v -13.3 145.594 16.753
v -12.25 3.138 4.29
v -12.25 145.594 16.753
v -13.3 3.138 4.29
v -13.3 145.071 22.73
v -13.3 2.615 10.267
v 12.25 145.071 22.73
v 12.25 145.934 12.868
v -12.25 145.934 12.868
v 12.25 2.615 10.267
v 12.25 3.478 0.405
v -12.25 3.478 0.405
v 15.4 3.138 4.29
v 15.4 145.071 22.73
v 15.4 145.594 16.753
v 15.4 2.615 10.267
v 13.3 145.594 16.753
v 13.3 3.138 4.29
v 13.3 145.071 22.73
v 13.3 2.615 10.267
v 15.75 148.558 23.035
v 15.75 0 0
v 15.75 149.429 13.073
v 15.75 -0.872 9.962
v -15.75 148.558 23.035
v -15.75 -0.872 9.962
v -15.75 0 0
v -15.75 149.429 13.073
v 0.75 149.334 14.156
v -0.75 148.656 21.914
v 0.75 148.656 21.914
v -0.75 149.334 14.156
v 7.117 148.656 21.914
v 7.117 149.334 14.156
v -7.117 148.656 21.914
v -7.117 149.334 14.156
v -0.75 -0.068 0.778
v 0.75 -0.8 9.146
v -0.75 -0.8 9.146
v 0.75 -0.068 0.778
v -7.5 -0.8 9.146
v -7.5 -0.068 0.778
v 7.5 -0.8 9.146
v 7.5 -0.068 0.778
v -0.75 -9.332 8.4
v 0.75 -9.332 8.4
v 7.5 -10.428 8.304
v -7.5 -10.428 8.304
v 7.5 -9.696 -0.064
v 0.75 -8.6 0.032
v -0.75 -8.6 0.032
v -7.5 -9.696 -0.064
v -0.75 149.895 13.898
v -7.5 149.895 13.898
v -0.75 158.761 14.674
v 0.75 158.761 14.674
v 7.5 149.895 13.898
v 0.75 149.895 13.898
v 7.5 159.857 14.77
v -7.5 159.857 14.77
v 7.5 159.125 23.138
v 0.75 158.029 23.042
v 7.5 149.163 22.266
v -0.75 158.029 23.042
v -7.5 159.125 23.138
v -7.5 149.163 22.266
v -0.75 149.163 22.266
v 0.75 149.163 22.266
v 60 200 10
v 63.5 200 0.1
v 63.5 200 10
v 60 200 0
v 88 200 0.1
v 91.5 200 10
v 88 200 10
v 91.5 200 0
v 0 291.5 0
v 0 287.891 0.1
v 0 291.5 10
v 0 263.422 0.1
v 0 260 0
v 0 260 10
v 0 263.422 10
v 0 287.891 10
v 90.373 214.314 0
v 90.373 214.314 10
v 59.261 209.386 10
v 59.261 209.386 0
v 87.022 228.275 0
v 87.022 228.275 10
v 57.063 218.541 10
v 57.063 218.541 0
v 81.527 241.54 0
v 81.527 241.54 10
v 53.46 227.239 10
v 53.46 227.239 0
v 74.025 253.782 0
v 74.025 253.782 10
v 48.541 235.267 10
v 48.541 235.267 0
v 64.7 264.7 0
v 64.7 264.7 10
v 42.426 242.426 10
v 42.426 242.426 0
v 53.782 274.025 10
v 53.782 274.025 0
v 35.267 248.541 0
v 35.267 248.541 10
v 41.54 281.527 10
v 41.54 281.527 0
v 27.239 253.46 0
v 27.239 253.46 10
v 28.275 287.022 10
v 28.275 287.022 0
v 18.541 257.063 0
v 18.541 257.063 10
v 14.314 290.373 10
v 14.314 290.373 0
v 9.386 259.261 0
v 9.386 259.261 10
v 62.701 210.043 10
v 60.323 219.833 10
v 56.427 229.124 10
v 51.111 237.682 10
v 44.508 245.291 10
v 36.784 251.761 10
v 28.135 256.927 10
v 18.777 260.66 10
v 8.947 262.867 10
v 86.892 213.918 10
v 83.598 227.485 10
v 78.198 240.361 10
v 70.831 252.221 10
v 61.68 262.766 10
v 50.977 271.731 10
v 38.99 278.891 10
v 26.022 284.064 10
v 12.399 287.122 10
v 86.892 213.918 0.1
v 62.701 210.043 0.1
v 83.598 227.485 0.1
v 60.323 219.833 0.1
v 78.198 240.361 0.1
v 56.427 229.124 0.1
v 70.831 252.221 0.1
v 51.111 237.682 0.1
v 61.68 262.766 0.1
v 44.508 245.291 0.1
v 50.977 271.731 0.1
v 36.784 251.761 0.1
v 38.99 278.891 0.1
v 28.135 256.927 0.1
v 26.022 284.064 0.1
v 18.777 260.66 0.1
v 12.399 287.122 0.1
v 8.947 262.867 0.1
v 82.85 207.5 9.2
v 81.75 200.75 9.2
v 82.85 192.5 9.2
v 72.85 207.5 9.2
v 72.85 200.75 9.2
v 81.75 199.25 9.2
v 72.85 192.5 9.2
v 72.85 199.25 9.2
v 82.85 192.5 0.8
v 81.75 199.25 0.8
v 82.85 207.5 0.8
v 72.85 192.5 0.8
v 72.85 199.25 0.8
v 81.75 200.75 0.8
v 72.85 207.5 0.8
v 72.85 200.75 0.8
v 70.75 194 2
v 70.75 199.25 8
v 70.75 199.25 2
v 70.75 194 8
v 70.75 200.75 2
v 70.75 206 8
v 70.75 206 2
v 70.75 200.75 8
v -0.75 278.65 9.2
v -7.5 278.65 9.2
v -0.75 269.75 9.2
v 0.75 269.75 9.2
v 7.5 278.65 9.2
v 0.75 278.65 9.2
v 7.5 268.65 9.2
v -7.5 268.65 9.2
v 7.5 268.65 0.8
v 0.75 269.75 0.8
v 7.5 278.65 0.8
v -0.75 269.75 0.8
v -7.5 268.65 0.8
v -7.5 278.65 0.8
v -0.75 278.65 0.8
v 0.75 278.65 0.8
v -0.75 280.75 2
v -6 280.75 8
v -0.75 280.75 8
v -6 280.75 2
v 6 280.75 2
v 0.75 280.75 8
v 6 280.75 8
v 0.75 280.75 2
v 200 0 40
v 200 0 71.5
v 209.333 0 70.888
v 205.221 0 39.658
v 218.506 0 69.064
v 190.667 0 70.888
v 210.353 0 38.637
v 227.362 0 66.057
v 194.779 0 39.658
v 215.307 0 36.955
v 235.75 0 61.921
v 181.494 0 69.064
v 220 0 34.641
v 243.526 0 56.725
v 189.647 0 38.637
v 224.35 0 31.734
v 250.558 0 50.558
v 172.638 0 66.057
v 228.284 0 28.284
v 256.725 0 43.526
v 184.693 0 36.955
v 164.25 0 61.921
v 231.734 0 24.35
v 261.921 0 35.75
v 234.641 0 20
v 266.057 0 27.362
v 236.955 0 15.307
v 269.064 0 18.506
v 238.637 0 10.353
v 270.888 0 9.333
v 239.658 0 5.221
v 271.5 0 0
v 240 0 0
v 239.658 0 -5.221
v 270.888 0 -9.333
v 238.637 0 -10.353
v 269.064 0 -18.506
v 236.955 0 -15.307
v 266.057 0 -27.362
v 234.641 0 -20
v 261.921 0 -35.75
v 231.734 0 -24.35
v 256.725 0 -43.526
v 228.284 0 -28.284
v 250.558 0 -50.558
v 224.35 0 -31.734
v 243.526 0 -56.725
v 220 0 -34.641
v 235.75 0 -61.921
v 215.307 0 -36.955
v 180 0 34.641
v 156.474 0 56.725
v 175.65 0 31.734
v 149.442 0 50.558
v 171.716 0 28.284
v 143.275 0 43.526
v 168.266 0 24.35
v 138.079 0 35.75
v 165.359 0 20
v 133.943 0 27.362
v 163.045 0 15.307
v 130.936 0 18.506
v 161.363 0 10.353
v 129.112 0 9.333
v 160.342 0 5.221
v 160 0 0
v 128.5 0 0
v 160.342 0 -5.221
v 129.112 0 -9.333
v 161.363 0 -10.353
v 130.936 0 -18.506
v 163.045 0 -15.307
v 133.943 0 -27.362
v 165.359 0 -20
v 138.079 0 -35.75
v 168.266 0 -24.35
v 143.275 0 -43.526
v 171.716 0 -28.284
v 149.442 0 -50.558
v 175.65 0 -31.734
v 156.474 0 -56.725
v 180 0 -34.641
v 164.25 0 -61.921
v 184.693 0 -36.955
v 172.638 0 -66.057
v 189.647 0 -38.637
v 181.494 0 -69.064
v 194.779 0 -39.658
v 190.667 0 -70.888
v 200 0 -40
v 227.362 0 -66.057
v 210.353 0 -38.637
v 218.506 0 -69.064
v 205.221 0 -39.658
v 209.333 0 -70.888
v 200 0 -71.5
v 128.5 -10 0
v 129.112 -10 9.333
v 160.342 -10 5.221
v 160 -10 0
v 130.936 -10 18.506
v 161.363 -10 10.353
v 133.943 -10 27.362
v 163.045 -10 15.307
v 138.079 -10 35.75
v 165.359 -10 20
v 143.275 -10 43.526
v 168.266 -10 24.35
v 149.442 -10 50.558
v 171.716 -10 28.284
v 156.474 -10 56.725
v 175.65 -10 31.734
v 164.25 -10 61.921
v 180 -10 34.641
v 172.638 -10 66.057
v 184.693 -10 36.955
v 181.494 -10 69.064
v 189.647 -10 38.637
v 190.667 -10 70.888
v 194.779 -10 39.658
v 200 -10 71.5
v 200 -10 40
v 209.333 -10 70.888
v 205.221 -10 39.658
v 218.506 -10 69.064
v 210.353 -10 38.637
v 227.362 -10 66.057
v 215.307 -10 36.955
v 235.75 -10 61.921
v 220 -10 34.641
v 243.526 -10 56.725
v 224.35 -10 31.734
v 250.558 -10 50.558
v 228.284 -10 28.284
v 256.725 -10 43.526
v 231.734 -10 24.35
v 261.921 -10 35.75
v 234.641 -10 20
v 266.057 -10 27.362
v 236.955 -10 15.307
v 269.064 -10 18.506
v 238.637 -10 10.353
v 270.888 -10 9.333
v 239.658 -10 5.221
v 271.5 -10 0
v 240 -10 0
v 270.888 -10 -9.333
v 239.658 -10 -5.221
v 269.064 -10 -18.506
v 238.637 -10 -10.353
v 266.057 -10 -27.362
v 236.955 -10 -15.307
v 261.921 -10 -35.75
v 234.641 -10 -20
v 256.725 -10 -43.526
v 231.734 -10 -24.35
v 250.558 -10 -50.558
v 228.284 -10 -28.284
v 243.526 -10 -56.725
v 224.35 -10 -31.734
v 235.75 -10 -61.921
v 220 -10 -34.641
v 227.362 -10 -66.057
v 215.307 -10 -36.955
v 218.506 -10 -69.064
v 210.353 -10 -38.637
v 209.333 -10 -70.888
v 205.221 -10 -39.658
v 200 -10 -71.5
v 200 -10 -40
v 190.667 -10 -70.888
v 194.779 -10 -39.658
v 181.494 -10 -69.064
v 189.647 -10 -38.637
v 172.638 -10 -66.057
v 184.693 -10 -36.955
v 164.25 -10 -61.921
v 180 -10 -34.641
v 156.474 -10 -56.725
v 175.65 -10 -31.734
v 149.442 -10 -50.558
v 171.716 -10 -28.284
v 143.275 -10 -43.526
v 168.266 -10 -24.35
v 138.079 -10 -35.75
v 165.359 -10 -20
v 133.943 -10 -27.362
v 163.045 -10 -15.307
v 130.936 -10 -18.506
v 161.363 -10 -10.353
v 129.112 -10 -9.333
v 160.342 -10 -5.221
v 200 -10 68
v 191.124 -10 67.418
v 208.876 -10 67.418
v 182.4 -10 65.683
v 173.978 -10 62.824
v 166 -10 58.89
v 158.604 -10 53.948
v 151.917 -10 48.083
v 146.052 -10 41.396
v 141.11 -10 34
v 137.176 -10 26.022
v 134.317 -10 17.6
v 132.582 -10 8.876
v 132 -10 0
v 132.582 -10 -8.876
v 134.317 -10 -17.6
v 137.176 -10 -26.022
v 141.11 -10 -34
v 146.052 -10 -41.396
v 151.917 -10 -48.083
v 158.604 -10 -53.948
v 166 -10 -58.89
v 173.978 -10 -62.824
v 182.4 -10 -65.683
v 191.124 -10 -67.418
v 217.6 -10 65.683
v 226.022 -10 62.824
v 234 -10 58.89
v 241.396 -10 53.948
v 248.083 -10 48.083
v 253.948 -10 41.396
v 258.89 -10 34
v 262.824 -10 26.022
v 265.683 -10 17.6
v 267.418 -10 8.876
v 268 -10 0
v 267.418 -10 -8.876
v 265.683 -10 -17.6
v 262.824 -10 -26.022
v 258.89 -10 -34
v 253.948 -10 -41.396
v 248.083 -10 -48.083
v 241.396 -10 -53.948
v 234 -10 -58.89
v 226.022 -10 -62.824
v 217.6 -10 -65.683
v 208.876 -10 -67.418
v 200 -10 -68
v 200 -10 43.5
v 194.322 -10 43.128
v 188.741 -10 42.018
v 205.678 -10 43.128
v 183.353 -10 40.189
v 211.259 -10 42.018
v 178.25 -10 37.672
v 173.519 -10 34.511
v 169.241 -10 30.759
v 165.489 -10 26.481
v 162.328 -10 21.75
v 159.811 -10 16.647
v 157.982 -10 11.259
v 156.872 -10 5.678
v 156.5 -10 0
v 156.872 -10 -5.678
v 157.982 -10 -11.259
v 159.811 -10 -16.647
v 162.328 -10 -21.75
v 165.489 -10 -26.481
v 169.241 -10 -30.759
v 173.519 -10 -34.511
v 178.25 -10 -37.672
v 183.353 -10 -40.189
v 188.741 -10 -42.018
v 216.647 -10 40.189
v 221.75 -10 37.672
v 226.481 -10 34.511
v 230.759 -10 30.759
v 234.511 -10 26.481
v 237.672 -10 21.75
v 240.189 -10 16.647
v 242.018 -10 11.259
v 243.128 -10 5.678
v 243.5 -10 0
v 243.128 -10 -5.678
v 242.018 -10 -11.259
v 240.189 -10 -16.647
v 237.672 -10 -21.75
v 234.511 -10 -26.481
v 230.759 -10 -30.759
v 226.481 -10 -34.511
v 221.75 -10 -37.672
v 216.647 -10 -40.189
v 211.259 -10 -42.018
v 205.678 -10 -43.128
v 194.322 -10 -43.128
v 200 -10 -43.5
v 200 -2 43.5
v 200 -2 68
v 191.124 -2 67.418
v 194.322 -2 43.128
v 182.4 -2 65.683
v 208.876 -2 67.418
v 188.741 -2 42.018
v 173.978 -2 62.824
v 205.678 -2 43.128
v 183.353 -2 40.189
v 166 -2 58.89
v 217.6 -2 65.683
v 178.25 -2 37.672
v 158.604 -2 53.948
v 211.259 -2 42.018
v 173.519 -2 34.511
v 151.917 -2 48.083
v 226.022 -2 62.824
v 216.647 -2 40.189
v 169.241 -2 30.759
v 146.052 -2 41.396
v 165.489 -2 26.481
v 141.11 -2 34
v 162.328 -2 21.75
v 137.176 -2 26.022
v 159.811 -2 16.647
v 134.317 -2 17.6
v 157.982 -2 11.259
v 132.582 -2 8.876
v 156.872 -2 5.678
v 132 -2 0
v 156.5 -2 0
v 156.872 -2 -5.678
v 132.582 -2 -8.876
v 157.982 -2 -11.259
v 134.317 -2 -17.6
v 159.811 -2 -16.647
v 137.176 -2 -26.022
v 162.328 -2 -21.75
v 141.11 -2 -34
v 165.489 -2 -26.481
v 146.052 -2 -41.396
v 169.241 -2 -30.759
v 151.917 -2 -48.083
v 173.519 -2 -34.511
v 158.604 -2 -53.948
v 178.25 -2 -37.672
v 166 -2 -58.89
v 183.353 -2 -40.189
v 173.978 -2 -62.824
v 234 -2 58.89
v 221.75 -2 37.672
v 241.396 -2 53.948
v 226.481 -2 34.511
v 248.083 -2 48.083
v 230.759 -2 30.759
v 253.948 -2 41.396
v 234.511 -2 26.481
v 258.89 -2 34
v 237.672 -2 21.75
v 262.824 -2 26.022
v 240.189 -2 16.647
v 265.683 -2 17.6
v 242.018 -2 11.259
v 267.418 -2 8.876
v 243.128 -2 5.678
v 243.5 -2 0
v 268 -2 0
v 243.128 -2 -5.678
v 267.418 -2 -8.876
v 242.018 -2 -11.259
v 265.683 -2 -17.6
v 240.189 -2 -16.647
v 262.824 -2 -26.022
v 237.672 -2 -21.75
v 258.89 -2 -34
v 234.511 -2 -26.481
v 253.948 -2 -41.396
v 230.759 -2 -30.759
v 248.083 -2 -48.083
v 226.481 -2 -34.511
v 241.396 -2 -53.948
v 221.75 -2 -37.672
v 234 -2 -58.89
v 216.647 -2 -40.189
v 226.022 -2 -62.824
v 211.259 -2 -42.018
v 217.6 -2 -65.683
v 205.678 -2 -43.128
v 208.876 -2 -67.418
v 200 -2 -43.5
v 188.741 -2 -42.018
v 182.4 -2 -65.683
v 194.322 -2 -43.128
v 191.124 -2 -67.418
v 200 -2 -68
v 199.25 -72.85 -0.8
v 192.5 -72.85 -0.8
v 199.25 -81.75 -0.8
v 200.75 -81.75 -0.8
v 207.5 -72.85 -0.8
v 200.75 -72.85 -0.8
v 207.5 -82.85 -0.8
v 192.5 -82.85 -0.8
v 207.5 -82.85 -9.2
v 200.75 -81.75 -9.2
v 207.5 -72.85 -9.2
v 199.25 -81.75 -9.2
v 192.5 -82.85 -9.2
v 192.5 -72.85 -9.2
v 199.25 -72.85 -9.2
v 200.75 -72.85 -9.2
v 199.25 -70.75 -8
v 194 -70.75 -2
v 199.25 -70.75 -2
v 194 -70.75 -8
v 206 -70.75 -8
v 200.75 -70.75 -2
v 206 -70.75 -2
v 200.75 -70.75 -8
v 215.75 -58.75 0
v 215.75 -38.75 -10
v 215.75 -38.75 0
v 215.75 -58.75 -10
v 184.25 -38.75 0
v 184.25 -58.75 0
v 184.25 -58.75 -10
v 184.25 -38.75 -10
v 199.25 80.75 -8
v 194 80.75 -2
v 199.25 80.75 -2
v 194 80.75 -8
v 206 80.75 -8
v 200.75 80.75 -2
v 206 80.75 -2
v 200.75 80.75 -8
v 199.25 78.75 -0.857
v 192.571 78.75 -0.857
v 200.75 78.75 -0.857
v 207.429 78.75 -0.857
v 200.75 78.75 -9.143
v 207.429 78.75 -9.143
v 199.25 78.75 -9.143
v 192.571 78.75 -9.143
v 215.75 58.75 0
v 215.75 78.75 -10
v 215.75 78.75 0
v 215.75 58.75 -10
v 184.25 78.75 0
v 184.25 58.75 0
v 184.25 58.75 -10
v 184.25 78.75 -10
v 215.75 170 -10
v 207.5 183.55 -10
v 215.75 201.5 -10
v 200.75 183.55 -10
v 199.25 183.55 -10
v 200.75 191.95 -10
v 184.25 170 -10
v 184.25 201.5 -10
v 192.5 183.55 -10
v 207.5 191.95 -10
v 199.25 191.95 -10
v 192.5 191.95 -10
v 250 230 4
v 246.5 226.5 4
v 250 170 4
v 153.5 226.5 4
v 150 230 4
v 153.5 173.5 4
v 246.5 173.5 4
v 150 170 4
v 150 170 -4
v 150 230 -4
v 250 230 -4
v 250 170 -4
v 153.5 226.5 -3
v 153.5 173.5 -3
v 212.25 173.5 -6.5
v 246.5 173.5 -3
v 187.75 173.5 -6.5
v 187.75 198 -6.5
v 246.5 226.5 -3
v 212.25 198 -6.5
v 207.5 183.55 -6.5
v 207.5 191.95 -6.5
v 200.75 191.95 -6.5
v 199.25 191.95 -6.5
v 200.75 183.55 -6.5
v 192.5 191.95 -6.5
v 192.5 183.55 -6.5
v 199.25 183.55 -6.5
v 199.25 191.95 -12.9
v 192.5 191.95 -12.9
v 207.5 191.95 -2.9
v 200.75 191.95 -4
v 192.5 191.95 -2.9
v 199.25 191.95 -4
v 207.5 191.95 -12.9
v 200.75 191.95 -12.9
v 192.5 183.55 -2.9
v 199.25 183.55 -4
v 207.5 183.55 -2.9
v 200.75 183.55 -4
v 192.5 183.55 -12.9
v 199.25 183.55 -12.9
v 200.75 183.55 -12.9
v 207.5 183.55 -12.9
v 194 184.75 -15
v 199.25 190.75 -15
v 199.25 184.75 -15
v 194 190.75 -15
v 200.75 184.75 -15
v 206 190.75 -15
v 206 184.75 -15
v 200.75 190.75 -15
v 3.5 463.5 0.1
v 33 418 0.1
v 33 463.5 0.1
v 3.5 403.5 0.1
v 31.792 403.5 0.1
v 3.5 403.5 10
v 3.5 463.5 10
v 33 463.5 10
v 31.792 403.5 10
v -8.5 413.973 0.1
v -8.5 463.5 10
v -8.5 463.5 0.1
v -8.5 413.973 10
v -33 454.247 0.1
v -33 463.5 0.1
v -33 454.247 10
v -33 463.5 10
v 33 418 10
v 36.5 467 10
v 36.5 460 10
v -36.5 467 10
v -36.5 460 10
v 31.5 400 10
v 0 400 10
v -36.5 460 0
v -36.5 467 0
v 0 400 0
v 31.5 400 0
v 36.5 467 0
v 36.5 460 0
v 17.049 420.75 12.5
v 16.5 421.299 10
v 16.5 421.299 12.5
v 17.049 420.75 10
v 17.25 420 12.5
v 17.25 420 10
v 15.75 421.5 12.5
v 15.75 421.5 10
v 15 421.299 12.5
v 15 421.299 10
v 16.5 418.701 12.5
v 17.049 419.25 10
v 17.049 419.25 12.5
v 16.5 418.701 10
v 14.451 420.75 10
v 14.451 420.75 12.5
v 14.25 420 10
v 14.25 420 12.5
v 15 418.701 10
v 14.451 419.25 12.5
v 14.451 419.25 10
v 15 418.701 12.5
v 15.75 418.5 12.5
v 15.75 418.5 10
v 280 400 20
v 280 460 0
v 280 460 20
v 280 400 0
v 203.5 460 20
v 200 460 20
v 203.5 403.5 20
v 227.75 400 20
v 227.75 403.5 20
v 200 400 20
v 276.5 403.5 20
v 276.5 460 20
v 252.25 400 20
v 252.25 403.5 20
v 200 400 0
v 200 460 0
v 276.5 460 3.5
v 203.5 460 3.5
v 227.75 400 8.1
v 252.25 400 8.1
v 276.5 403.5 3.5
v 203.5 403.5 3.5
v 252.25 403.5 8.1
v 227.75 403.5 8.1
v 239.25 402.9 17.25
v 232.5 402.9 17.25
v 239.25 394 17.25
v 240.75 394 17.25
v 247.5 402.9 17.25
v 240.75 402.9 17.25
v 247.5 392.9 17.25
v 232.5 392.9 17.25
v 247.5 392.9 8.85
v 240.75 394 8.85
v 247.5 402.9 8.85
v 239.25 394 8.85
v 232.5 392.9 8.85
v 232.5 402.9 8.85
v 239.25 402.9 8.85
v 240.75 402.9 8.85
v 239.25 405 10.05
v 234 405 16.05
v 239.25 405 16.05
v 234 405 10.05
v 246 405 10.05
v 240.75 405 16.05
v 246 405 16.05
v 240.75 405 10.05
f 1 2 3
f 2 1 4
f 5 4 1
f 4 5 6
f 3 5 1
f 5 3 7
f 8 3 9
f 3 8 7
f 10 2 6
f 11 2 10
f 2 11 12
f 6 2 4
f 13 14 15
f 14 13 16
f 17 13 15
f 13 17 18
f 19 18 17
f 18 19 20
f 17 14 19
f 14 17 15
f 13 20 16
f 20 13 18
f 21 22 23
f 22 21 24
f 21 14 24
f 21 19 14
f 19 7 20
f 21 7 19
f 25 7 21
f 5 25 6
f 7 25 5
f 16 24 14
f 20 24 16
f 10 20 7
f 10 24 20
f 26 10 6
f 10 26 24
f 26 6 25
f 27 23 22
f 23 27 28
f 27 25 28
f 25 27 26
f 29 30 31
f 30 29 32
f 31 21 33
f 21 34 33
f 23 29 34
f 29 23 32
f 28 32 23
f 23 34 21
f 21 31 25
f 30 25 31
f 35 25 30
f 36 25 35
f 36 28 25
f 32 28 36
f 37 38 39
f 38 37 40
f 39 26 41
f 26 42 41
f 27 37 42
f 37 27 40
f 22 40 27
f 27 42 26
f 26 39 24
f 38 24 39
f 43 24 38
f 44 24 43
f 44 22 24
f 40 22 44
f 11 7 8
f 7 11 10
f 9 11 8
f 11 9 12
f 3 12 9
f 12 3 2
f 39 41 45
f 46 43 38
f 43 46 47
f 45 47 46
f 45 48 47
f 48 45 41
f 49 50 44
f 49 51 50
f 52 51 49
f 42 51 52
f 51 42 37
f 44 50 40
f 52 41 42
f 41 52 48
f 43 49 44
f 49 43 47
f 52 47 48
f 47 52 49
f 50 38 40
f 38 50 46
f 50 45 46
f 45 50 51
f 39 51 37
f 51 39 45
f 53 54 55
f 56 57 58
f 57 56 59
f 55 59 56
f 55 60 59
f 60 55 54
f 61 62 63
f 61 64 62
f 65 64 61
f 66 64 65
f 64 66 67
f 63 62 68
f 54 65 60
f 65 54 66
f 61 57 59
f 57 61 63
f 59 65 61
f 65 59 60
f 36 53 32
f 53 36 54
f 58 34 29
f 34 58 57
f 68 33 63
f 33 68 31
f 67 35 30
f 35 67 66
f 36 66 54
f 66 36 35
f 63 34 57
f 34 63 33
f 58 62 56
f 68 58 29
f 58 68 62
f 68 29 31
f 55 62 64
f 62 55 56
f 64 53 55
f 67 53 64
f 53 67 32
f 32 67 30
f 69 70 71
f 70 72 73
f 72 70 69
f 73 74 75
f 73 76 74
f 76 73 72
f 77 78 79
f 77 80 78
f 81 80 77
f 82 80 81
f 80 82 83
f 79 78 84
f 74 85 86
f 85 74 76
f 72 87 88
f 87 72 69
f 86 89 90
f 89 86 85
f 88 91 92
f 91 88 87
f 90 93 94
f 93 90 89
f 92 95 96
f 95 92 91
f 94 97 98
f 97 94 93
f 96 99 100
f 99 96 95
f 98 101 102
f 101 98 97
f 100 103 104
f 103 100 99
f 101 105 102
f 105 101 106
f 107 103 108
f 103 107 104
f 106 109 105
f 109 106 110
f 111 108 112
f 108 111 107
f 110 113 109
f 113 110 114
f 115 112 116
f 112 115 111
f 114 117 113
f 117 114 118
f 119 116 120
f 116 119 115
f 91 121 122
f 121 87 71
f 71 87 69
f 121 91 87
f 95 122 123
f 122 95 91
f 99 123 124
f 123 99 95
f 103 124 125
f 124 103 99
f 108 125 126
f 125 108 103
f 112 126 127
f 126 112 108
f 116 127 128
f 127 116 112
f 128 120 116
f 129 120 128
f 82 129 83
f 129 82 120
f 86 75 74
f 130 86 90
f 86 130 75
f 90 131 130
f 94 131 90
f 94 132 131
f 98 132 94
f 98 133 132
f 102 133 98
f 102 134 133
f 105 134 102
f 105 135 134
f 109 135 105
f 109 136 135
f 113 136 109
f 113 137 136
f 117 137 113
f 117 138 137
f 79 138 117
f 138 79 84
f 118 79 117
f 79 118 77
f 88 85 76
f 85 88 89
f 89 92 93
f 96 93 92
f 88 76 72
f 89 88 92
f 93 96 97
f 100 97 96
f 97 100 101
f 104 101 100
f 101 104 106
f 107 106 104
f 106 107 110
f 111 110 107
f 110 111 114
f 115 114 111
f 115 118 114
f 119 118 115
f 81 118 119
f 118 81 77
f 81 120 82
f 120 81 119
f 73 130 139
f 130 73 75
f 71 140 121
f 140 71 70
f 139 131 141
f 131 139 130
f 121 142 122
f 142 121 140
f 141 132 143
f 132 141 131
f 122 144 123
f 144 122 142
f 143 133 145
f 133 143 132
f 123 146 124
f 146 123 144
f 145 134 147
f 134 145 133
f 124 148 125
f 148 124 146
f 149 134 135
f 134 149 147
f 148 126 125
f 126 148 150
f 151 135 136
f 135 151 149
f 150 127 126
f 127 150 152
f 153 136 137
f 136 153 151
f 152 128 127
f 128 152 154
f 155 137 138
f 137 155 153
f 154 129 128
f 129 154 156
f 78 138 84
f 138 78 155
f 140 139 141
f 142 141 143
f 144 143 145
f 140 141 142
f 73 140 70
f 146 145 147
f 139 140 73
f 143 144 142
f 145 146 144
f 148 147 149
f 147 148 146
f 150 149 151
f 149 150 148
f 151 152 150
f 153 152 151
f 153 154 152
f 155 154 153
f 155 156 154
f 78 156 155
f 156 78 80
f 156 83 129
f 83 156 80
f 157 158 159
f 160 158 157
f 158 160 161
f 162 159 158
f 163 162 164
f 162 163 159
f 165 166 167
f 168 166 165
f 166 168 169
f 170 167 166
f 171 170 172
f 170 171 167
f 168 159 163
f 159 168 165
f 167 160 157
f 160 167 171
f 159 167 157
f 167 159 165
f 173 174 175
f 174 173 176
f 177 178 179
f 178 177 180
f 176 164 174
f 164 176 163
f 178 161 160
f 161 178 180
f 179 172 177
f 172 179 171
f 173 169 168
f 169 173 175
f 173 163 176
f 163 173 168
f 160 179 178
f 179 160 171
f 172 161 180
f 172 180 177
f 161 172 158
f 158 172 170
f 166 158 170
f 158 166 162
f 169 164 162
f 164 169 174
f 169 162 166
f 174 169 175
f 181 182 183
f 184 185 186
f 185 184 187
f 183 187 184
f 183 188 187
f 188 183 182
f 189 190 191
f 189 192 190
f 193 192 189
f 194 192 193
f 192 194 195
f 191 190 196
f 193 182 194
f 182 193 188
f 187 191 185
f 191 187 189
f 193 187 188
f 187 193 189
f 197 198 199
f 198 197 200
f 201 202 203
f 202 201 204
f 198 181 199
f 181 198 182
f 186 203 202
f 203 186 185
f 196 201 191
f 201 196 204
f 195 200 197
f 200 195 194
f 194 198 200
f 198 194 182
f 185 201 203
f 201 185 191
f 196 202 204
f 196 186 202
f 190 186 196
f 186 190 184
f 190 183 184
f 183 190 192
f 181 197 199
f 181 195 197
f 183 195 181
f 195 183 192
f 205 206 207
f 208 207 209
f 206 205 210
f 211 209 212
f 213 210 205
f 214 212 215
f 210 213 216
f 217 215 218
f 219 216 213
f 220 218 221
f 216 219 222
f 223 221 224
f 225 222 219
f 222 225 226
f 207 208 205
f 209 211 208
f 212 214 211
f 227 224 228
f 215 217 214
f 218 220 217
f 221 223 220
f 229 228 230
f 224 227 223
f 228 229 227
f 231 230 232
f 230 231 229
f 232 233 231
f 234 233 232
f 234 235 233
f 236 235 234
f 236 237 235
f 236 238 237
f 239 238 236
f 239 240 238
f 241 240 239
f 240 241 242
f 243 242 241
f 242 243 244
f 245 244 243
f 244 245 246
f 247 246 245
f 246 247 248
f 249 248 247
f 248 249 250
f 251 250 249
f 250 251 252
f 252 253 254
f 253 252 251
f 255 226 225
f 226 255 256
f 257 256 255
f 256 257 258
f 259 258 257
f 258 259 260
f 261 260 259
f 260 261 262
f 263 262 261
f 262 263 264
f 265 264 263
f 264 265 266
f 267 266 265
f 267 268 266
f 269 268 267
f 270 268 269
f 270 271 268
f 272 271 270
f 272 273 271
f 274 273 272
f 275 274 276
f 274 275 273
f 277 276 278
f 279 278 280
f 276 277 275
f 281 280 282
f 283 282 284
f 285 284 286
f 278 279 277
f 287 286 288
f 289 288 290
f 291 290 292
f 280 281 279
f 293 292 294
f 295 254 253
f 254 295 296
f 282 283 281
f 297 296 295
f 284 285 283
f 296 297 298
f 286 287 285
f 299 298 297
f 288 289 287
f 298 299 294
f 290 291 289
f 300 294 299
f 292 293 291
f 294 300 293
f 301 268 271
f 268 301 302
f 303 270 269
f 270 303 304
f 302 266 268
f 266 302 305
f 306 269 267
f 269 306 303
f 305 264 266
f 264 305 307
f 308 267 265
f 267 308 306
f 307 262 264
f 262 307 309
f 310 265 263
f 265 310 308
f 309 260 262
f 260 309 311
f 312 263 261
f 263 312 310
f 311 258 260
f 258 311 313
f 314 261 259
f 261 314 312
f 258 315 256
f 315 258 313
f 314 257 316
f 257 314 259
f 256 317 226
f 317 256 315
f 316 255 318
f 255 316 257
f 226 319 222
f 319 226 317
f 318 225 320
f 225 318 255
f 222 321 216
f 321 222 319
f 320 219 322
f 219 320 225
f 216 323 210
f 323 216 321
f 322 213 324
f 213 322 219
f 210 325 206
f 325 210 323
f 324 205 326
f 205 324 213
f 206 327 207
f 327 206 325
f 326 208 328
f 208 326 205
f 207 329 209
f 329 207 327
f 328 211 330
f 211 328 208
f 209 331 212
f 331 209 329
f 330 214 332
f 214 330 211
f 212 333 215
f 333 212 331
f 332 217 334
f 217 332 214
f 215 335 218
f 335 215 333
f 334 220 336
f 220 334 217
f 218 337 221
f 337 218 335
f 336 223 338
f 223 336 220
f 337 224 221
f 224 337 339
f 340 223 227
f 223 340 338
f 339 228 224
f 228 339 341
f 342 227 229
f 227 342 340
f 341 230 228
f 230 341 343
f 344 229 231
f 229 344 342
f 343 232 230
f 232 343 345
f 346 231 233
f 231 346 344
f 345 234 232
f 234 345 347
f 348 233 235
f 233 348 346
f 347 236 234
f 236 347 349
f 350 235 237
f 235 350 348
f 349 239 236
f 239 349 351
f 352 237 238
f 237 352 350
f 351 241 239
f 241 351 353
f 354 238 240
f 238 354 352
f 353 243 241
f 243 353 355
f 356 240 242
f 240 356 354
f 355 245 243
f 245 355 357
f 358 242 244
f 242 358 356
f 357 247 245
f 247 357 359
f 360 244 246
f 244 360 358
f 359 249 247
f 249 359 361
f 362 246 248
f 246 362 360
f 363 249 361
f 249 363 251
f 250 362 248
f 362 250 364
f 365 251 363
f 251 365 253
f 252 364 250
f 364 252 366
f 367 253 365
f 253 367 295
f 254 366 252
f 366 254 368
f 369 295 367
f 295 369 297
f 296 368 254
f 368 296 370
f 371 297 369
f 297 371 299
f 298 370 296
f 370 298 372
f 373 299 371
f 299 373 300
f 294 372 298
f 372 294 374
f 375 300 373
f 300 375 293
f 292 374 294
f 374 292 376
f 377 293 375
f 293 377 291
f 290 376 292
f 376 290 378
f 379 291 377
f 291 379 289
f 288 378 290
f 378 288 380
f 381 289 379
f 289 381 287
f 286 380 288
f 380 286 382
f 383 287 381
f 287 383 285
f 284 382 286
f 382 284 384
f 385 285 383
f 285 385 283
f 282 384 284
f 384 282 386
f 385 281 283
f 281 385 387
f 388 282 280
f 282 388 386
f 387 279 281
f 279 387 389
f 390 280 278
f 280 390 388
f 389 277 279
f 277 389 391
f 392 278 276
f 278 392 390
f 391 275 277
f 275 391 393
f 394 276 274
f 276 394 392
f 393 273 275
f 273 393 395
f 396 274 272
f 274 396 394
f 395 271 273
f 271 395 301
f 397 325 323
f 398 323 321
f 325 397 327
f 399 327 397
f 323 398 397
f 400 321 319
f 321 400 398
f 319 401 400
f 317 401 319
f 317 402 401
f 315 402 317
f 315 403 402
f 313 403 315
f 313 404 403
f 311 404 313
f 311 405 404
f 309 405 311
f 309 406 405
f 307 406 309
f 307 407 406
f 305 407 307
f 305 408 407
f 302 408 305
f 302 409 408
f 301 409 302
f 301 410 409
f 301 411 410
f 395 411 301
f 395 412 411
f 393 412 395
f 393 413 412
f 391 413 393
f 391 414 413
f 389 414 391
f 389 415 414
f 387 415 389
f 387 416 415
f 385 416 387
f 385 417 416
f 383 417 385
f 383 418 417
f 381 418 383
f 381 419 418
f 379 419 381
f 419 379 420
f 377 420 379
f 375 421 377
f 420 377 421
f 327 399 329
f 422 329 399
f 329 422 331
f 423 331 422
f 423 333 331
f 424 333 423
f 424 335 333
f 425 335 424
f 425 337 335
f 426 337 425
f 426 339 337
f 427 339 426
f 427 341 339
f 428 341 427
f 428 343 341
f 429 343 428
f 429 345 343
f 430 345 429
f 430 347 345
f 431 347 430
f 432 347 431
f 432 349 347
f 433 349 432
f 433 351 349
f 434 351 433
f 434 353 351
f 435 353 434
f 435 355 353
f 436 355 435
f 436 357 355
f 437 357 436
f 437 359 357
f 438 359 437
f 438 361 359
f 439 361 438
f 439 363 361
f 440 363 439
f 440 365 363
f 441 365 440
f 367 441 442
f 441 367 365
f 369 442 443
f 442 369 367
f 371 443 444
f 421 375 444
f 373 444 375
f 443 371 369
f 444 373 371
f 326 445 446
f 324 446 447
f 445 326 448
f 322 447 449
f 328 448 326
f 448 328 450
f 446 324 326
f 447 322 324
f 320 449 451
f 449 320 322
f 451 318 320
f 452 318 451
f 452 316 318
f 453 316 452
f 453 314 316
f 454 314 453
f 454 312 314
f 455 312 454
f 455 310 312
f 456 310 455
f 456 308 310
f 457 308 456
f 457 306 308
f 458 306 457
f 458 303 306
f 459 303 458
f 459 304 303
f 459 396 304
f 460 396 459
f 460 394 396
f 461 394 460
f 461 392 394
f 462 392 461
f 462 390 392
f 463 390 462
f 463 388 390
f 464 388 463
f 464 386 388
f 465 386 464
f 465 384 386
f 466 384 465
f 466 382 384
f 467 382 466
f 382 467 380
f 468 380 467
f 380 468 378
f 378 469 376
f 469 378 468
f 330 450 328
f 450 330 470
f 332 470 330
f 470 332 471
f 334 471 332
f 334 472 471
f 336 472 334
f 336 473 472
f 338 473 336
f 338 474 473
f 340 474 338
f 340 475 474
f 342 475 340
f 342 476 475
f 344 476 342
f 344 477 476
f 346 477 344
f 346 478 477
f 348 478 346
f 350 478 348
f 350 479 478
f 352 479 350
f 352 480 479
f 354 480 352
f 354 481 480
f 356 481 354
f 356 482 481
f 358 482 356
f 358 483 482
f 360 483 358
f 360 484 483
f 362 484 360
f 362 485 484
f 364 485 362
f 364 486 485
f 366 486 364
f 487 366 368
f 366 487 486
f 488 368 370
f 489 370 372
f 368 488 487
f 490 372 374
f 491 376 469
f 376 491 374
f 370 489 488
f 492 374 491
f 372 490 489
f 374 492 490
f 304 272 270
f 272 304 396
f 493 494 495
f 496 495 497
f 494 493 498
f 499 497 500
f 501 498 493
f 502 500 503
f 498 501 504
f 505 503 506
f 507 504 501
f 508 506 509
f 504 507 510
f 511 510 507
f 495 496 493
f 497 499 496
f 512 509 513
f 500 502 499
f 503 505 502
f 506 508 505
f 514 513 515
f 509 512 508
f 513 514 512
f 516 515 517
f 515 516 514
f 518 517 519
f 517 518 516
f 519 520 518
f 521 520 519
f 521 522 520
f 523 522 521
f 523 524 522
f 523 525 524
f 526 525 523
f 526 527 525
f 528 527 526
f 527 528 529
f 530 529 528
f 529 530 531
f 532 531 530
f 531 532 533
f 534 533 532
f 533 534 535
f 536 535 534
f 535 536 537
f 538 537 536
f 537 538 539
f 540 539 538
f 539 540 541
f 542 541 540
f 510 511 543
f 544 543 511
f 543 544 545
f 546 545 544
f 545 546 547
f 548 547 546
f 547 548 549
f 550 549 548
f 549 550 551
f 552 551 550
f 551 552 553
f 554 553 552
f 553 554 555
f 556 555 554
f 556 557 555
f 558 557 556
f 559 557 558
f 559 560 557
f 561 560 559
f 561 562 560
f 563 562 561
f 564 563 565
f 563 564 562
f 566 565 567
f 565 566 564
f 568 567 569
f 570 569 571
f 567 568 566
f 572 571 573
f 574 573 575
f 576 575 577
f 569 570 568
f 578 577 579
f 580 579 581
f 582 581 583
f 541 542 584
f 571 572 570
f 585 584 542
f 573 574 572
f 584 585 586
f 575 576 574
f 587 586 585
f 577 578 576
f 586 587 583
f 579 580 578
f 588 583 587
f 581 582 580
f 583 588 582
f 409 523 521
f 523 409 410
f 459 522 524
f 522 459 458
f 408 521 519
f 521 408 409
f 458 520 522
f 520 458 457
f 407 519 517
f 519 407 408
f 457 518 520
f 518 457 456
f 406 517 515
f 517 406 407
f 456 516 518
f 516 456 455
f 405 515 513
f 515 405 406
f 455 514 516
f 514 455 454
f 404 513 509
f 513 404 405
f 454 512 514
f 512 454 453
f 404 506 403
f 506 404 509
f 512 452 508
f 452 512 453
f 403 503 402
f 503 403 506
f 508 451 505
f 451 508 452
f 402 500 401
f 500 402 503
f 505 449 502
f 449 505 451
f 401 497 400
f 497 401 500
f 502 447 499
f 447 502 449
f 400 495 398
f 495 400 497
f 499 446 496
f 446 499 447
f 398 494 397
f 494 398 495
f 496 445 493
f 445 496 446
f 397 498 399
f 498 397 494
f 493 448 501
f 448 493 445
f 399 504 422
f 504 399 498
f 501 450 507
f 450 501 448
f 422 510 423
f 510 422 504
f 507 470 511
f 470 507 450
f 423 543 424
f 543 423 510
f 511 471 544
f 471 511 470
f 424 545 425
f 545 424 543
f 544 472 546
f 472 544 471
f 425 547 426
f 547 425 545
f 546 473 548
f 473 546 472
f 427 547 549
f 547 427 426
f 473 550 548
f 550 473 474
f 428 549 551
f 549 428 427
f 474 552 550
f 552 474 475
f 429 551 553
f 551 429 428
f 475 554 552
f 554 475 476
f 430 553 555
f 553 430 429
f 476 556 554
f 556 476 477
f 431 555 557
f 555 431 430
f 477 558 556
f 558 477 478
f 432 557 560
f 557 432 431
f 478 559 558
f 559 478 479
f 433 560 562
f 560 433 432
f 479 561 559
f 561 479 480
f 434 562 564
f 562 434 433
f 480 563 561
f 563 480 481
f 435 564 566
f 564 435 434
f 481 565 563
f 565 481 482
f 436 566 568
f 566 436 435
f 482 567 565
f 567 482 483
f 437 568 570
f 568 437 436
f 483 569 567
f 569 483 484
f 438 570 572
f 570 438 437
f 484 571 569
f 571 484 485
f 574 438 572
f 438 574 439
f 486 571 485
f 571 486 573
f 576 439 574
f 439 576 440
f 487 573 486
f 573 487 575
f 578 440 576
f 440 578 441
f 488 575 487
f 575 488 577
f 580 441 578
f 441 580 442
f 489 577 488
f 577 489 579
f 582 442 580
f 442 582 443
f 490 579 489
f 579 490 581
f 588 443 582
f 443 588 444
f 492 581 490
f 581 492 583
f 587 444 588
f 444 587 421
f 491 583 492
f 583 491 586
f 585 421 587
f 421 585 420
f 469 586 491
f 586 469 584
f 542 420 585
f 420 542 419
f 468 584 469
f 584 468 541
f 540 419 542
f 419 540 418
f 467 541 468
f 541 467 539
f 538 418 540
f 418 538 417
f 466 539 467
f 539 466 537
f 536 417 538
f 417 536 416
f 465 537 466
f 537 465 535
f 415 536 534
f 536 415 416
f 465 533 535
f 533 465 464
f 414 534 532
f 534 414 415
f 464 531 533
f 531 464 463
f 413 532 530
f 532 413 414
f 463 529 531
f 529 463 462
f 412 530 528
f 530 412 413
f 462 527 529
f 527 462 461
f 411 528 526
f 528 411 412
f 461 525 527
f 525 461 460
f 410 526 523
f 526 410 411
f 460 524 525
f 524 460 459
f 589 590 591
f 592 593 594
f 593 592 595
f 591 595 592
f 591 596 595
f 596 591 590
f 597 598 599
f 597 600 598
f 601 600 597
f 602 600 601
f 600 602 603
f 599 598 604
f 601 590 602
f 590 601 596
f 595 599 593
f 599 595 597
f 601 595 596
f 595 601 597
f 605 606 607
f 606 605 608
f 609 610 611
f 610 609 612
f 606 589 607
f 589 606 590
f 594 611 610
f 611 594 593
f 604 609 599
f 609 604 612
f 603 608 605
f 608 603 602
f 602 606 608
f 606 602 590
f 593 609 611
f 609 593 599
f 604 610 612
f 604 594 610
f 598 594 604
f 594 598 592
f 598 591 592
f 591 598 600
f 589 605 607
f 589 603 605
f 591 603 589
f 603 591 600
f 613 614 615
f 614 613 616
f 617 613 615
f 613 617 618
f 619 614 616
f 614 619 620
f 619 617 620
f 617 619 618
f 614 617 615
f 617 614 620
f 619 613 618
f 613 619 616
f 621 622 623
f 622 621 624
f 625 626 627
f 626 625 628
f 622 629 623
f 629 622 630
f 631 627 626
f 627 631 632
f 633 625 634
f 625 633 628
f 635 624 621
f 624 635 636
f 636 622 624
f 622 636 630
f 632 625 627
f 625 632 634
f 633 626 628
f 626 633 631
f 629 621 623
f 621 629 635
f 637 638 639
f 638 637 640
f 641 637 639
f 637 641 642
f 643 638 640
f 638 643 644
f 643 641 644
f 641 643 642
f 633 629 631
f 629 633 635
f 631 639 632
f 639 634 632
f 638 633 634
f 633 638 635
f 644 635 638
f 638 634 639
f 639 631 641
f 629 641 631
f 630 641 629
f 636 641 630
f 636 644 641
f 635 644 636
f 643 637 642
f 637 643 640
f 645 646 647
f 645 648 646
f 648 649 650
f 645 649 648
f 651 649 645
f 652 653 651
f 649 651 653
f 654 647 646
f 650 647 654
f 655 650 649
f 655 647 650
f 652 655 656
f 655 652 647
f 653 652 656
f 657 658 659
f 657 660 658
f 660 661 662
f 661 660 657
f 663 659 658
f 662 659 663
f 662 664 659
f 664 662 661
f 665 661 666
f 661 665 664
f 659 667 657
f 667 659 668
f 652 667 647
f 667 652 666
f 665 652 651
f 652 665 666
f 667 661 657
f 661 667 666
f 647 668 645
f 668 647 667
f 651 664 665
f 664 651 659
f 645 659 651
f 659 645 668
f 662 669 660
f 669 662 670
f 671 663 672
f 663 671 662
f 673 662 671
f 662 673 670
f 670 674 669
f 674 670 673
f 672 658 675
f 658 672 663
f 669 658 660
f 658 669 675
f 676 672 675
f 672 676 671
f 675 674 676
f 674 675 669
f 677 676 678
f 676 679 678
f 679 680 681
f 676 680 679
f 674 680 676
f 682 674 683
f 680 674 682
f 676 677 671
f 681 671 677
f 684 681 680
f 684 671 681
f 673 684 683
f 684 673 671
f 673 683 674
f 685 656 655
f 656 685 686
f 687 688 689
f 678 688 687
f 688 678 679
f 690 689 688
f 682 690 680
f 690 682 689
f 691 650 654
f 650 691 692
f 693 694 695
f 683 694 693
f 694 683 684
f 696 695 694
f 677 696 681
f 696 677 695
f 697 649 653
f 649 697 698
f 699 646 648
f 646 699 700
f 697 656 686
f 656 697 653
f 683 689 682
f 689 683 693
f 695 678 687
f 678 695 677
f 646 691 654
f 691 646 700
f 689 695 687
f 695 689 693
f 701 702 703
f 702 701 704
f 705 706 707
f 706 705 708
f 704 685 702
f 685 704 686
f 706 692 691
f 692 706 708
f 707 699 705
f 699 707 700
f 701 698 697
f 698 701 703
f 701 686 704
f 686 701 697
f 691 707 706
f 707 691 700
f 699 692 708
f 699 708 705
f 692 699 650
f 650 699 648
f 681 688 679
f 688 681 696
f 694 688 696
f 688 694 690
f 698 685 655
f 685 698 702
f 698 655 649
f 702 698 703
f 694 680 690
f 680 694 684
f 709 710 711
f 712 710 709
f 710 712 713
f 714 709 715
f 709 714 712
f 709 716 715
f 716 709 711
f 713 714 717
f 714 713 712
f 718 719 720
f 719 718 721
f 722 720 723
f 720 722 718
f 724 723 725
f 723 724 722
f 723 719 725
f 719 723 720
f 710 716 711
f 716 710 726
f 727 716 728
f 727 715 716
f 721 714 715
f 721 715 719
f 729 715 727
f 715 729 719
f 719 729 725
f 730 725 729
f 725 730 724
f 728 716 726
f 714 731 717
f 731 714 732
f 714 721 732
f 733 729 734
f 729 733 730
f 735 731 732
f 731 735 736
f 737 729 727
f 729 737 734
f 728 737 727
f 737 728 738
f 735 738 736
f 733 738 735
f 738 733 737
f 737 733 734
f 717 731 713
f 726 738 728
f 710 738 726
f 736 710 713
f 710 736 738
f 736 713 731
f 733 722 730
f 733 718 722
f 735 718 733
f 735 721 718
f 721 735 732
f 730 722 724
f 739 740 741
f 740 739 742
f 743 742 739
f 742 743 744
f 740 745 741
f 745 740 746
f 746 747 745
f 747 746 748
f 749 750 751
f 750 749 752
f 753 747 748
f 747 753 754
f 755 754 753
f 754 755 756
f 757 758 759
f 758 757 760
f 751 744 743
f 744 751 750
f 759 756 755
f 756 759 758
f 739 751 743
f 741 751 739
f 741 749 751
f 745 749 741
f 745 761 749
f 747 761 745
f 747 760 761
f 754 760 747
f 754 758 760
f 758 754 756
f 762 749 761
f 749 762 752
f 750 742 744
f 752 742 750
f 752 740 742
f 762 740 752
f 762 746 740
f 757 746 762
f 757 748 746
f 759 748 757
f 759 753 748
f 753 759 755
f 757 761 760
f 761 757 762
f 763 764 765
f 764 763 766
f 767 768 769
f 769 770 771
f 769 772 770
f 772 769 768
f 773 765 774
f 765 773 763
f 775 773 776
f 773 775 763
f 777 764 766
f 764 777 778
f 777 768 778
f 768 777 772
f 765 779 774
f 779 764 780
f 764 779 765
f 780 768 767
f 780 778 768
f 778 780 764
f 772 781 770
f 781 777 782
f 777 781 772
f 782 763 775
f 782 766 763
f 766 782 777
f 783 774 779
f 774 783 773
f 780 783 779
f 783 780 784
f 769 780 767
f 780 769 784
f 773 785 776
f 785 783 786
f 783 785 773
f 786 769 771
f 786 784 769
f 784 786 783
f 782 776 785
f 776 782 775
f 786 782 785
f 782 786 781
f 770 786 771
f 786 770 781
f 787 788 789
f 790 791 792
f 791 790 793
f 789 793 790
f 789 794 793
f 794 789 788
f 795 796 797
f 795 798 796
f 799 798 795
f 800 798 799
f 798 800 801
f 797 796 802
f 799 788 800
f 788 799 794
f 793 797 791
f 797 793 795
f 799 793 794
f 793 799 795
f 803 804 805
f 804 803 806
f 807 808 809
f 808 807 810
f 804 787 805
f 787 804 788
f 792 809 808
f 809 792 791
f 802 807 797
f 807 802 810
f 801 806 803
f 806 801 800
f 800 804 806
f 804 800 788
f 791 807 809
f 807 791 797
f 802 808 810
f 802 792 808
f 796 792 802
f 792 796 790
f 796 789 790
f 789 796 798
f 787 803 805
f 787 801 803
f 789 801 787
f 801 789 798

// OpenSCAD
// Modular Marble Run — 6 Snap-Connect Track Sections
// Marble diameter: 16mm (standard glass marble)
// Clip system: dovetail snap on each end, connects at any angle
// PLA — 0.2mm, 4 walls, 20% infill — print flat, 0 supports

MARBLE_D  = 16.5;  // Marble diameter + clearance
TRACK_W   = MARBLE_D + 8;   // Track channel width
TRACK_H   = MARBLE_D * 0.6; // Track channel depth (open top)
WALL      = 3.5;
SECTION_H = 10;    // Track piece thickness
SNAP_W    = 12;
SNAP_H    = 6;
SNAP_LOCK = 1.5;   // Snap tooth depth
SLOPE     = 5;     // Ramp slope angle (degrees)

// ── Snap connector (dovetail) ──────────────────────────
// Female socket (subtract from end)
module snap_socket() {
    hull() {
        cube([SNAP_W, SNAP_H*1.4, WALL+1], center=true);
        translate([0,0,-SNAP_H*0.3]) cube([SNAP_W+SNAP_LOCK*2, SNAP_H, WALL+1], center=true);
    }
}

// Male plug (add to start)
module snap_plug() {
    difference() {
        hull() {
            cube([SNAP_W, SNAP_H, SECTION_H], center=true);
            translate([0,0,SNAP_H*0.35]) cube([SNAP_W+SNAP_LOCK*2, SNAP_H*1.4, SECTION_H], center=true);
        }
        // Flex slot (allows snap spring action)
        cube([1.5, SNAP_H*2, SECTION_H+2], center=true);
    }
}

// ── Track channel profile ──────────────────────────────
module track_channel(len) {
    difference() {
        translate([-TRACK_W/2-WALL, 0, 0])
            cube([TRACK_W+WALL*2, len, SECTION_H]);
        // Marble channel (U-shaped groove)
        translate([-TRACK_W/2, WALL, SECTION_H-TRACK_H])
            cube([TRACK_W, len-WALL*2, TRACK_H+1]);
        // Guide lips (keep marble centered)
        for (sx=[-1,1])
            translate([sx*(TRACK_W/2+WALL*0.3), WALL, SECTION_H*0.4])
                cube([WALL*0.6, len-WALL*2, SECTION_H*0.7]);
    }
}

// ── 1. STRAIGHT ramp (150mm, 5° slope) ───────────────
module straight_ramp() {
    L = 150;
    rotate([SLOPE, 0, 0])
        track_channel(L);
    // Snap plugs on each end
    translate([0, 0, SECTION_H/2])
        rotate([SLOPE,0,0]) {
            translate([0, -3, 0]) rotate([90,0,0]) snap_plug();
            translate([0, L+3, 0]) rotate([-90,0,0]) snap_plug();
        }
}

// ── 2. CURVE section (90° arc, R=60mm) ───────────────
module curve_section() {
    R = 60;
    difference() {
        // Outer arc
        rotate_extrude(angle=90, $fn=40)
            translate([R, 0])
                square([TRACK_W+WALL*2, SECTION_H]);
        // Inner arc (channel)
        rotate_extrude(angle=91, $fn=40)
            translate([R+WALL, SECTION_H-TRACK_H])
                square([TRACK_W, TRACK_H+1]);
    }
    // Snap connectors
    translate([R+TRACK_W/2+WALL, 0, SECTION_H/2])
        rotate([90,0,90]) snap_plug();
    translate([0, R+TRACK_W/2+WALL, SECTION_H/2])
        rotate([90,0,0]) snap_plug();
}

// ── 3. LOOP-THE-LOOP (full 360° vertical loop) ────────
module loop_track() {
    R = 40;
    LOOP_W = TRACK_W + WALL*2;
    difference() {
        rotate([90,0,0]) {
            difference() {
                rotate_extrude(angle=360, $fn=48)
                    translate([R, 0])
                        square([LOOP_W, SECTION_H]);
                // Inner channel
                rotate_extrude(angle=361, $fn=48)
                    translate([R+WALL, 2])
                        square([TRACK_W, SECTION_H-2]);
            }
        }
        // Bottom cutout (entry/exit)
        translate([-LOOP_W/2-1, -5, -SECTION_H])
            cube([LOOP_W+2, 15, SECTION_H+1]);
    }
    // Entry/exit straight pieces
    for (sy=[-1,1])
        translate([0, sy*(R+LOOP_W/2+8), -SECTION_H/2])
            rotate([0,0,0]) {
                translate([-TRACK_W/2-WALL, sy*(-5), -SECTION_H/2])
                    cube([TRACK_W+WALL*2, 20, SECTION_H]);
                translate([0, sy*(12), 0]) rotate([90,0,0]) snap_plug();
            }
}

// ── 4. FUNNEL / COLLECTOR (catches missed marbles) ────
module funnel_section() {
    FW = 100;  // Funnel opening width
    FD = 60;
    difference() {
        hull() {
            cube([FW, FD, 8], center=true);
            translate([0, -FD/2+TRACK_W/2+WALL, -SECTION_H/2])
                cube([TRACK_W+WALL*2, TRACK_W+WALL*2, SECTION_H], center=true);
        }
        // Funnel bore
        hull() {
            translate([0,0,1]) cube([FW-WALL*2, FD-WALL*2, 8], center=true);
            translate([0, -FD/2+TRACK_W/2+WALL, -SECTION_H/2+WALL])
                cube([TRACK_W, TRACK_W, SECTION_H], center=true);
        }
    }
    // Snap plug at funnel exit
    translate([0, -FD/2+TRACK_W/2+WALL+2, -SECTION_H])
        rotate([0,0,0]) snap_plug();
}

// ── 5. SPLITTER (1 marble → 2 paths, random) ──────────
module splitter_section() {
    L = 60;
    // Y-junction body
    difference() {
        hull() {
            cube([TRACK_W+WALL*2, WALL*2, SECTION_H]);
            translate([-(TRACK_W+WALL*2+5), L, 0])
                cube([TRACK_W+WALL*2, WALL*2, SECTION_H]);
            translate([5, L, 0])
                cube([TRACK_W+WALL*2, WALL*2, SECTION_H]);
        }
        // Channels (3 arms)
        for (dx=[0, -(TRACK_W+WALL*2+5), 5])
            translate([dx+WALL, WALL, SECTION_H-TRACK_H])
                cube([TRACK_W, L, TRACK_H+1]);
        // Diverter pivot hole
        translate([TRACK_W/2+WALL, L/3, SECTION_H+1])
            cylinder(d=4, h=5, $fn=12);
    }
    // Random diverter fin (pivots left/right on each marble impact)
    translate([TRACK_W/2+WALL, L/3, SECTION_H])
        cylinder(d=3, h=2.5, $fn=12);
}

// ── 6. EXIT CATCHER / tray ────────────────────────────
module exit_tray() {
    TW = 80;
    TD = 60;
    difference() {
        cube([TW, TD, 20]);
        translate([WALL, WALL, WALL])
            cube([TW-WALL*2, TD-WALL, 22]);
        // Entry notch (marble rolls in)
        translate([TW/2-TRACK_W/2, -1, 20-TRACK_H-2])
            cube([TRACK_W, WALL+2, TRACK_H+3]);
    }
    // Snap socket at entry
    translate([TW/2, 0, 20-TRACK_H/2-2])
        rotate([90,0,0]) snap_plug();
}

// ── DISPLAY LAYOUT (print each as separate file in practice) ──
// All 6 pieces shown spread out for visualization
straight_ramp();
translate([0, 200, 0]) curve_section();
translate([200, 0, 0]) loop_track();
translate([200, 200, 0]) funnel_section();
translate([0, 400, 0]) splitter_section();
translate([200, 400, 0]) exit_tray();
